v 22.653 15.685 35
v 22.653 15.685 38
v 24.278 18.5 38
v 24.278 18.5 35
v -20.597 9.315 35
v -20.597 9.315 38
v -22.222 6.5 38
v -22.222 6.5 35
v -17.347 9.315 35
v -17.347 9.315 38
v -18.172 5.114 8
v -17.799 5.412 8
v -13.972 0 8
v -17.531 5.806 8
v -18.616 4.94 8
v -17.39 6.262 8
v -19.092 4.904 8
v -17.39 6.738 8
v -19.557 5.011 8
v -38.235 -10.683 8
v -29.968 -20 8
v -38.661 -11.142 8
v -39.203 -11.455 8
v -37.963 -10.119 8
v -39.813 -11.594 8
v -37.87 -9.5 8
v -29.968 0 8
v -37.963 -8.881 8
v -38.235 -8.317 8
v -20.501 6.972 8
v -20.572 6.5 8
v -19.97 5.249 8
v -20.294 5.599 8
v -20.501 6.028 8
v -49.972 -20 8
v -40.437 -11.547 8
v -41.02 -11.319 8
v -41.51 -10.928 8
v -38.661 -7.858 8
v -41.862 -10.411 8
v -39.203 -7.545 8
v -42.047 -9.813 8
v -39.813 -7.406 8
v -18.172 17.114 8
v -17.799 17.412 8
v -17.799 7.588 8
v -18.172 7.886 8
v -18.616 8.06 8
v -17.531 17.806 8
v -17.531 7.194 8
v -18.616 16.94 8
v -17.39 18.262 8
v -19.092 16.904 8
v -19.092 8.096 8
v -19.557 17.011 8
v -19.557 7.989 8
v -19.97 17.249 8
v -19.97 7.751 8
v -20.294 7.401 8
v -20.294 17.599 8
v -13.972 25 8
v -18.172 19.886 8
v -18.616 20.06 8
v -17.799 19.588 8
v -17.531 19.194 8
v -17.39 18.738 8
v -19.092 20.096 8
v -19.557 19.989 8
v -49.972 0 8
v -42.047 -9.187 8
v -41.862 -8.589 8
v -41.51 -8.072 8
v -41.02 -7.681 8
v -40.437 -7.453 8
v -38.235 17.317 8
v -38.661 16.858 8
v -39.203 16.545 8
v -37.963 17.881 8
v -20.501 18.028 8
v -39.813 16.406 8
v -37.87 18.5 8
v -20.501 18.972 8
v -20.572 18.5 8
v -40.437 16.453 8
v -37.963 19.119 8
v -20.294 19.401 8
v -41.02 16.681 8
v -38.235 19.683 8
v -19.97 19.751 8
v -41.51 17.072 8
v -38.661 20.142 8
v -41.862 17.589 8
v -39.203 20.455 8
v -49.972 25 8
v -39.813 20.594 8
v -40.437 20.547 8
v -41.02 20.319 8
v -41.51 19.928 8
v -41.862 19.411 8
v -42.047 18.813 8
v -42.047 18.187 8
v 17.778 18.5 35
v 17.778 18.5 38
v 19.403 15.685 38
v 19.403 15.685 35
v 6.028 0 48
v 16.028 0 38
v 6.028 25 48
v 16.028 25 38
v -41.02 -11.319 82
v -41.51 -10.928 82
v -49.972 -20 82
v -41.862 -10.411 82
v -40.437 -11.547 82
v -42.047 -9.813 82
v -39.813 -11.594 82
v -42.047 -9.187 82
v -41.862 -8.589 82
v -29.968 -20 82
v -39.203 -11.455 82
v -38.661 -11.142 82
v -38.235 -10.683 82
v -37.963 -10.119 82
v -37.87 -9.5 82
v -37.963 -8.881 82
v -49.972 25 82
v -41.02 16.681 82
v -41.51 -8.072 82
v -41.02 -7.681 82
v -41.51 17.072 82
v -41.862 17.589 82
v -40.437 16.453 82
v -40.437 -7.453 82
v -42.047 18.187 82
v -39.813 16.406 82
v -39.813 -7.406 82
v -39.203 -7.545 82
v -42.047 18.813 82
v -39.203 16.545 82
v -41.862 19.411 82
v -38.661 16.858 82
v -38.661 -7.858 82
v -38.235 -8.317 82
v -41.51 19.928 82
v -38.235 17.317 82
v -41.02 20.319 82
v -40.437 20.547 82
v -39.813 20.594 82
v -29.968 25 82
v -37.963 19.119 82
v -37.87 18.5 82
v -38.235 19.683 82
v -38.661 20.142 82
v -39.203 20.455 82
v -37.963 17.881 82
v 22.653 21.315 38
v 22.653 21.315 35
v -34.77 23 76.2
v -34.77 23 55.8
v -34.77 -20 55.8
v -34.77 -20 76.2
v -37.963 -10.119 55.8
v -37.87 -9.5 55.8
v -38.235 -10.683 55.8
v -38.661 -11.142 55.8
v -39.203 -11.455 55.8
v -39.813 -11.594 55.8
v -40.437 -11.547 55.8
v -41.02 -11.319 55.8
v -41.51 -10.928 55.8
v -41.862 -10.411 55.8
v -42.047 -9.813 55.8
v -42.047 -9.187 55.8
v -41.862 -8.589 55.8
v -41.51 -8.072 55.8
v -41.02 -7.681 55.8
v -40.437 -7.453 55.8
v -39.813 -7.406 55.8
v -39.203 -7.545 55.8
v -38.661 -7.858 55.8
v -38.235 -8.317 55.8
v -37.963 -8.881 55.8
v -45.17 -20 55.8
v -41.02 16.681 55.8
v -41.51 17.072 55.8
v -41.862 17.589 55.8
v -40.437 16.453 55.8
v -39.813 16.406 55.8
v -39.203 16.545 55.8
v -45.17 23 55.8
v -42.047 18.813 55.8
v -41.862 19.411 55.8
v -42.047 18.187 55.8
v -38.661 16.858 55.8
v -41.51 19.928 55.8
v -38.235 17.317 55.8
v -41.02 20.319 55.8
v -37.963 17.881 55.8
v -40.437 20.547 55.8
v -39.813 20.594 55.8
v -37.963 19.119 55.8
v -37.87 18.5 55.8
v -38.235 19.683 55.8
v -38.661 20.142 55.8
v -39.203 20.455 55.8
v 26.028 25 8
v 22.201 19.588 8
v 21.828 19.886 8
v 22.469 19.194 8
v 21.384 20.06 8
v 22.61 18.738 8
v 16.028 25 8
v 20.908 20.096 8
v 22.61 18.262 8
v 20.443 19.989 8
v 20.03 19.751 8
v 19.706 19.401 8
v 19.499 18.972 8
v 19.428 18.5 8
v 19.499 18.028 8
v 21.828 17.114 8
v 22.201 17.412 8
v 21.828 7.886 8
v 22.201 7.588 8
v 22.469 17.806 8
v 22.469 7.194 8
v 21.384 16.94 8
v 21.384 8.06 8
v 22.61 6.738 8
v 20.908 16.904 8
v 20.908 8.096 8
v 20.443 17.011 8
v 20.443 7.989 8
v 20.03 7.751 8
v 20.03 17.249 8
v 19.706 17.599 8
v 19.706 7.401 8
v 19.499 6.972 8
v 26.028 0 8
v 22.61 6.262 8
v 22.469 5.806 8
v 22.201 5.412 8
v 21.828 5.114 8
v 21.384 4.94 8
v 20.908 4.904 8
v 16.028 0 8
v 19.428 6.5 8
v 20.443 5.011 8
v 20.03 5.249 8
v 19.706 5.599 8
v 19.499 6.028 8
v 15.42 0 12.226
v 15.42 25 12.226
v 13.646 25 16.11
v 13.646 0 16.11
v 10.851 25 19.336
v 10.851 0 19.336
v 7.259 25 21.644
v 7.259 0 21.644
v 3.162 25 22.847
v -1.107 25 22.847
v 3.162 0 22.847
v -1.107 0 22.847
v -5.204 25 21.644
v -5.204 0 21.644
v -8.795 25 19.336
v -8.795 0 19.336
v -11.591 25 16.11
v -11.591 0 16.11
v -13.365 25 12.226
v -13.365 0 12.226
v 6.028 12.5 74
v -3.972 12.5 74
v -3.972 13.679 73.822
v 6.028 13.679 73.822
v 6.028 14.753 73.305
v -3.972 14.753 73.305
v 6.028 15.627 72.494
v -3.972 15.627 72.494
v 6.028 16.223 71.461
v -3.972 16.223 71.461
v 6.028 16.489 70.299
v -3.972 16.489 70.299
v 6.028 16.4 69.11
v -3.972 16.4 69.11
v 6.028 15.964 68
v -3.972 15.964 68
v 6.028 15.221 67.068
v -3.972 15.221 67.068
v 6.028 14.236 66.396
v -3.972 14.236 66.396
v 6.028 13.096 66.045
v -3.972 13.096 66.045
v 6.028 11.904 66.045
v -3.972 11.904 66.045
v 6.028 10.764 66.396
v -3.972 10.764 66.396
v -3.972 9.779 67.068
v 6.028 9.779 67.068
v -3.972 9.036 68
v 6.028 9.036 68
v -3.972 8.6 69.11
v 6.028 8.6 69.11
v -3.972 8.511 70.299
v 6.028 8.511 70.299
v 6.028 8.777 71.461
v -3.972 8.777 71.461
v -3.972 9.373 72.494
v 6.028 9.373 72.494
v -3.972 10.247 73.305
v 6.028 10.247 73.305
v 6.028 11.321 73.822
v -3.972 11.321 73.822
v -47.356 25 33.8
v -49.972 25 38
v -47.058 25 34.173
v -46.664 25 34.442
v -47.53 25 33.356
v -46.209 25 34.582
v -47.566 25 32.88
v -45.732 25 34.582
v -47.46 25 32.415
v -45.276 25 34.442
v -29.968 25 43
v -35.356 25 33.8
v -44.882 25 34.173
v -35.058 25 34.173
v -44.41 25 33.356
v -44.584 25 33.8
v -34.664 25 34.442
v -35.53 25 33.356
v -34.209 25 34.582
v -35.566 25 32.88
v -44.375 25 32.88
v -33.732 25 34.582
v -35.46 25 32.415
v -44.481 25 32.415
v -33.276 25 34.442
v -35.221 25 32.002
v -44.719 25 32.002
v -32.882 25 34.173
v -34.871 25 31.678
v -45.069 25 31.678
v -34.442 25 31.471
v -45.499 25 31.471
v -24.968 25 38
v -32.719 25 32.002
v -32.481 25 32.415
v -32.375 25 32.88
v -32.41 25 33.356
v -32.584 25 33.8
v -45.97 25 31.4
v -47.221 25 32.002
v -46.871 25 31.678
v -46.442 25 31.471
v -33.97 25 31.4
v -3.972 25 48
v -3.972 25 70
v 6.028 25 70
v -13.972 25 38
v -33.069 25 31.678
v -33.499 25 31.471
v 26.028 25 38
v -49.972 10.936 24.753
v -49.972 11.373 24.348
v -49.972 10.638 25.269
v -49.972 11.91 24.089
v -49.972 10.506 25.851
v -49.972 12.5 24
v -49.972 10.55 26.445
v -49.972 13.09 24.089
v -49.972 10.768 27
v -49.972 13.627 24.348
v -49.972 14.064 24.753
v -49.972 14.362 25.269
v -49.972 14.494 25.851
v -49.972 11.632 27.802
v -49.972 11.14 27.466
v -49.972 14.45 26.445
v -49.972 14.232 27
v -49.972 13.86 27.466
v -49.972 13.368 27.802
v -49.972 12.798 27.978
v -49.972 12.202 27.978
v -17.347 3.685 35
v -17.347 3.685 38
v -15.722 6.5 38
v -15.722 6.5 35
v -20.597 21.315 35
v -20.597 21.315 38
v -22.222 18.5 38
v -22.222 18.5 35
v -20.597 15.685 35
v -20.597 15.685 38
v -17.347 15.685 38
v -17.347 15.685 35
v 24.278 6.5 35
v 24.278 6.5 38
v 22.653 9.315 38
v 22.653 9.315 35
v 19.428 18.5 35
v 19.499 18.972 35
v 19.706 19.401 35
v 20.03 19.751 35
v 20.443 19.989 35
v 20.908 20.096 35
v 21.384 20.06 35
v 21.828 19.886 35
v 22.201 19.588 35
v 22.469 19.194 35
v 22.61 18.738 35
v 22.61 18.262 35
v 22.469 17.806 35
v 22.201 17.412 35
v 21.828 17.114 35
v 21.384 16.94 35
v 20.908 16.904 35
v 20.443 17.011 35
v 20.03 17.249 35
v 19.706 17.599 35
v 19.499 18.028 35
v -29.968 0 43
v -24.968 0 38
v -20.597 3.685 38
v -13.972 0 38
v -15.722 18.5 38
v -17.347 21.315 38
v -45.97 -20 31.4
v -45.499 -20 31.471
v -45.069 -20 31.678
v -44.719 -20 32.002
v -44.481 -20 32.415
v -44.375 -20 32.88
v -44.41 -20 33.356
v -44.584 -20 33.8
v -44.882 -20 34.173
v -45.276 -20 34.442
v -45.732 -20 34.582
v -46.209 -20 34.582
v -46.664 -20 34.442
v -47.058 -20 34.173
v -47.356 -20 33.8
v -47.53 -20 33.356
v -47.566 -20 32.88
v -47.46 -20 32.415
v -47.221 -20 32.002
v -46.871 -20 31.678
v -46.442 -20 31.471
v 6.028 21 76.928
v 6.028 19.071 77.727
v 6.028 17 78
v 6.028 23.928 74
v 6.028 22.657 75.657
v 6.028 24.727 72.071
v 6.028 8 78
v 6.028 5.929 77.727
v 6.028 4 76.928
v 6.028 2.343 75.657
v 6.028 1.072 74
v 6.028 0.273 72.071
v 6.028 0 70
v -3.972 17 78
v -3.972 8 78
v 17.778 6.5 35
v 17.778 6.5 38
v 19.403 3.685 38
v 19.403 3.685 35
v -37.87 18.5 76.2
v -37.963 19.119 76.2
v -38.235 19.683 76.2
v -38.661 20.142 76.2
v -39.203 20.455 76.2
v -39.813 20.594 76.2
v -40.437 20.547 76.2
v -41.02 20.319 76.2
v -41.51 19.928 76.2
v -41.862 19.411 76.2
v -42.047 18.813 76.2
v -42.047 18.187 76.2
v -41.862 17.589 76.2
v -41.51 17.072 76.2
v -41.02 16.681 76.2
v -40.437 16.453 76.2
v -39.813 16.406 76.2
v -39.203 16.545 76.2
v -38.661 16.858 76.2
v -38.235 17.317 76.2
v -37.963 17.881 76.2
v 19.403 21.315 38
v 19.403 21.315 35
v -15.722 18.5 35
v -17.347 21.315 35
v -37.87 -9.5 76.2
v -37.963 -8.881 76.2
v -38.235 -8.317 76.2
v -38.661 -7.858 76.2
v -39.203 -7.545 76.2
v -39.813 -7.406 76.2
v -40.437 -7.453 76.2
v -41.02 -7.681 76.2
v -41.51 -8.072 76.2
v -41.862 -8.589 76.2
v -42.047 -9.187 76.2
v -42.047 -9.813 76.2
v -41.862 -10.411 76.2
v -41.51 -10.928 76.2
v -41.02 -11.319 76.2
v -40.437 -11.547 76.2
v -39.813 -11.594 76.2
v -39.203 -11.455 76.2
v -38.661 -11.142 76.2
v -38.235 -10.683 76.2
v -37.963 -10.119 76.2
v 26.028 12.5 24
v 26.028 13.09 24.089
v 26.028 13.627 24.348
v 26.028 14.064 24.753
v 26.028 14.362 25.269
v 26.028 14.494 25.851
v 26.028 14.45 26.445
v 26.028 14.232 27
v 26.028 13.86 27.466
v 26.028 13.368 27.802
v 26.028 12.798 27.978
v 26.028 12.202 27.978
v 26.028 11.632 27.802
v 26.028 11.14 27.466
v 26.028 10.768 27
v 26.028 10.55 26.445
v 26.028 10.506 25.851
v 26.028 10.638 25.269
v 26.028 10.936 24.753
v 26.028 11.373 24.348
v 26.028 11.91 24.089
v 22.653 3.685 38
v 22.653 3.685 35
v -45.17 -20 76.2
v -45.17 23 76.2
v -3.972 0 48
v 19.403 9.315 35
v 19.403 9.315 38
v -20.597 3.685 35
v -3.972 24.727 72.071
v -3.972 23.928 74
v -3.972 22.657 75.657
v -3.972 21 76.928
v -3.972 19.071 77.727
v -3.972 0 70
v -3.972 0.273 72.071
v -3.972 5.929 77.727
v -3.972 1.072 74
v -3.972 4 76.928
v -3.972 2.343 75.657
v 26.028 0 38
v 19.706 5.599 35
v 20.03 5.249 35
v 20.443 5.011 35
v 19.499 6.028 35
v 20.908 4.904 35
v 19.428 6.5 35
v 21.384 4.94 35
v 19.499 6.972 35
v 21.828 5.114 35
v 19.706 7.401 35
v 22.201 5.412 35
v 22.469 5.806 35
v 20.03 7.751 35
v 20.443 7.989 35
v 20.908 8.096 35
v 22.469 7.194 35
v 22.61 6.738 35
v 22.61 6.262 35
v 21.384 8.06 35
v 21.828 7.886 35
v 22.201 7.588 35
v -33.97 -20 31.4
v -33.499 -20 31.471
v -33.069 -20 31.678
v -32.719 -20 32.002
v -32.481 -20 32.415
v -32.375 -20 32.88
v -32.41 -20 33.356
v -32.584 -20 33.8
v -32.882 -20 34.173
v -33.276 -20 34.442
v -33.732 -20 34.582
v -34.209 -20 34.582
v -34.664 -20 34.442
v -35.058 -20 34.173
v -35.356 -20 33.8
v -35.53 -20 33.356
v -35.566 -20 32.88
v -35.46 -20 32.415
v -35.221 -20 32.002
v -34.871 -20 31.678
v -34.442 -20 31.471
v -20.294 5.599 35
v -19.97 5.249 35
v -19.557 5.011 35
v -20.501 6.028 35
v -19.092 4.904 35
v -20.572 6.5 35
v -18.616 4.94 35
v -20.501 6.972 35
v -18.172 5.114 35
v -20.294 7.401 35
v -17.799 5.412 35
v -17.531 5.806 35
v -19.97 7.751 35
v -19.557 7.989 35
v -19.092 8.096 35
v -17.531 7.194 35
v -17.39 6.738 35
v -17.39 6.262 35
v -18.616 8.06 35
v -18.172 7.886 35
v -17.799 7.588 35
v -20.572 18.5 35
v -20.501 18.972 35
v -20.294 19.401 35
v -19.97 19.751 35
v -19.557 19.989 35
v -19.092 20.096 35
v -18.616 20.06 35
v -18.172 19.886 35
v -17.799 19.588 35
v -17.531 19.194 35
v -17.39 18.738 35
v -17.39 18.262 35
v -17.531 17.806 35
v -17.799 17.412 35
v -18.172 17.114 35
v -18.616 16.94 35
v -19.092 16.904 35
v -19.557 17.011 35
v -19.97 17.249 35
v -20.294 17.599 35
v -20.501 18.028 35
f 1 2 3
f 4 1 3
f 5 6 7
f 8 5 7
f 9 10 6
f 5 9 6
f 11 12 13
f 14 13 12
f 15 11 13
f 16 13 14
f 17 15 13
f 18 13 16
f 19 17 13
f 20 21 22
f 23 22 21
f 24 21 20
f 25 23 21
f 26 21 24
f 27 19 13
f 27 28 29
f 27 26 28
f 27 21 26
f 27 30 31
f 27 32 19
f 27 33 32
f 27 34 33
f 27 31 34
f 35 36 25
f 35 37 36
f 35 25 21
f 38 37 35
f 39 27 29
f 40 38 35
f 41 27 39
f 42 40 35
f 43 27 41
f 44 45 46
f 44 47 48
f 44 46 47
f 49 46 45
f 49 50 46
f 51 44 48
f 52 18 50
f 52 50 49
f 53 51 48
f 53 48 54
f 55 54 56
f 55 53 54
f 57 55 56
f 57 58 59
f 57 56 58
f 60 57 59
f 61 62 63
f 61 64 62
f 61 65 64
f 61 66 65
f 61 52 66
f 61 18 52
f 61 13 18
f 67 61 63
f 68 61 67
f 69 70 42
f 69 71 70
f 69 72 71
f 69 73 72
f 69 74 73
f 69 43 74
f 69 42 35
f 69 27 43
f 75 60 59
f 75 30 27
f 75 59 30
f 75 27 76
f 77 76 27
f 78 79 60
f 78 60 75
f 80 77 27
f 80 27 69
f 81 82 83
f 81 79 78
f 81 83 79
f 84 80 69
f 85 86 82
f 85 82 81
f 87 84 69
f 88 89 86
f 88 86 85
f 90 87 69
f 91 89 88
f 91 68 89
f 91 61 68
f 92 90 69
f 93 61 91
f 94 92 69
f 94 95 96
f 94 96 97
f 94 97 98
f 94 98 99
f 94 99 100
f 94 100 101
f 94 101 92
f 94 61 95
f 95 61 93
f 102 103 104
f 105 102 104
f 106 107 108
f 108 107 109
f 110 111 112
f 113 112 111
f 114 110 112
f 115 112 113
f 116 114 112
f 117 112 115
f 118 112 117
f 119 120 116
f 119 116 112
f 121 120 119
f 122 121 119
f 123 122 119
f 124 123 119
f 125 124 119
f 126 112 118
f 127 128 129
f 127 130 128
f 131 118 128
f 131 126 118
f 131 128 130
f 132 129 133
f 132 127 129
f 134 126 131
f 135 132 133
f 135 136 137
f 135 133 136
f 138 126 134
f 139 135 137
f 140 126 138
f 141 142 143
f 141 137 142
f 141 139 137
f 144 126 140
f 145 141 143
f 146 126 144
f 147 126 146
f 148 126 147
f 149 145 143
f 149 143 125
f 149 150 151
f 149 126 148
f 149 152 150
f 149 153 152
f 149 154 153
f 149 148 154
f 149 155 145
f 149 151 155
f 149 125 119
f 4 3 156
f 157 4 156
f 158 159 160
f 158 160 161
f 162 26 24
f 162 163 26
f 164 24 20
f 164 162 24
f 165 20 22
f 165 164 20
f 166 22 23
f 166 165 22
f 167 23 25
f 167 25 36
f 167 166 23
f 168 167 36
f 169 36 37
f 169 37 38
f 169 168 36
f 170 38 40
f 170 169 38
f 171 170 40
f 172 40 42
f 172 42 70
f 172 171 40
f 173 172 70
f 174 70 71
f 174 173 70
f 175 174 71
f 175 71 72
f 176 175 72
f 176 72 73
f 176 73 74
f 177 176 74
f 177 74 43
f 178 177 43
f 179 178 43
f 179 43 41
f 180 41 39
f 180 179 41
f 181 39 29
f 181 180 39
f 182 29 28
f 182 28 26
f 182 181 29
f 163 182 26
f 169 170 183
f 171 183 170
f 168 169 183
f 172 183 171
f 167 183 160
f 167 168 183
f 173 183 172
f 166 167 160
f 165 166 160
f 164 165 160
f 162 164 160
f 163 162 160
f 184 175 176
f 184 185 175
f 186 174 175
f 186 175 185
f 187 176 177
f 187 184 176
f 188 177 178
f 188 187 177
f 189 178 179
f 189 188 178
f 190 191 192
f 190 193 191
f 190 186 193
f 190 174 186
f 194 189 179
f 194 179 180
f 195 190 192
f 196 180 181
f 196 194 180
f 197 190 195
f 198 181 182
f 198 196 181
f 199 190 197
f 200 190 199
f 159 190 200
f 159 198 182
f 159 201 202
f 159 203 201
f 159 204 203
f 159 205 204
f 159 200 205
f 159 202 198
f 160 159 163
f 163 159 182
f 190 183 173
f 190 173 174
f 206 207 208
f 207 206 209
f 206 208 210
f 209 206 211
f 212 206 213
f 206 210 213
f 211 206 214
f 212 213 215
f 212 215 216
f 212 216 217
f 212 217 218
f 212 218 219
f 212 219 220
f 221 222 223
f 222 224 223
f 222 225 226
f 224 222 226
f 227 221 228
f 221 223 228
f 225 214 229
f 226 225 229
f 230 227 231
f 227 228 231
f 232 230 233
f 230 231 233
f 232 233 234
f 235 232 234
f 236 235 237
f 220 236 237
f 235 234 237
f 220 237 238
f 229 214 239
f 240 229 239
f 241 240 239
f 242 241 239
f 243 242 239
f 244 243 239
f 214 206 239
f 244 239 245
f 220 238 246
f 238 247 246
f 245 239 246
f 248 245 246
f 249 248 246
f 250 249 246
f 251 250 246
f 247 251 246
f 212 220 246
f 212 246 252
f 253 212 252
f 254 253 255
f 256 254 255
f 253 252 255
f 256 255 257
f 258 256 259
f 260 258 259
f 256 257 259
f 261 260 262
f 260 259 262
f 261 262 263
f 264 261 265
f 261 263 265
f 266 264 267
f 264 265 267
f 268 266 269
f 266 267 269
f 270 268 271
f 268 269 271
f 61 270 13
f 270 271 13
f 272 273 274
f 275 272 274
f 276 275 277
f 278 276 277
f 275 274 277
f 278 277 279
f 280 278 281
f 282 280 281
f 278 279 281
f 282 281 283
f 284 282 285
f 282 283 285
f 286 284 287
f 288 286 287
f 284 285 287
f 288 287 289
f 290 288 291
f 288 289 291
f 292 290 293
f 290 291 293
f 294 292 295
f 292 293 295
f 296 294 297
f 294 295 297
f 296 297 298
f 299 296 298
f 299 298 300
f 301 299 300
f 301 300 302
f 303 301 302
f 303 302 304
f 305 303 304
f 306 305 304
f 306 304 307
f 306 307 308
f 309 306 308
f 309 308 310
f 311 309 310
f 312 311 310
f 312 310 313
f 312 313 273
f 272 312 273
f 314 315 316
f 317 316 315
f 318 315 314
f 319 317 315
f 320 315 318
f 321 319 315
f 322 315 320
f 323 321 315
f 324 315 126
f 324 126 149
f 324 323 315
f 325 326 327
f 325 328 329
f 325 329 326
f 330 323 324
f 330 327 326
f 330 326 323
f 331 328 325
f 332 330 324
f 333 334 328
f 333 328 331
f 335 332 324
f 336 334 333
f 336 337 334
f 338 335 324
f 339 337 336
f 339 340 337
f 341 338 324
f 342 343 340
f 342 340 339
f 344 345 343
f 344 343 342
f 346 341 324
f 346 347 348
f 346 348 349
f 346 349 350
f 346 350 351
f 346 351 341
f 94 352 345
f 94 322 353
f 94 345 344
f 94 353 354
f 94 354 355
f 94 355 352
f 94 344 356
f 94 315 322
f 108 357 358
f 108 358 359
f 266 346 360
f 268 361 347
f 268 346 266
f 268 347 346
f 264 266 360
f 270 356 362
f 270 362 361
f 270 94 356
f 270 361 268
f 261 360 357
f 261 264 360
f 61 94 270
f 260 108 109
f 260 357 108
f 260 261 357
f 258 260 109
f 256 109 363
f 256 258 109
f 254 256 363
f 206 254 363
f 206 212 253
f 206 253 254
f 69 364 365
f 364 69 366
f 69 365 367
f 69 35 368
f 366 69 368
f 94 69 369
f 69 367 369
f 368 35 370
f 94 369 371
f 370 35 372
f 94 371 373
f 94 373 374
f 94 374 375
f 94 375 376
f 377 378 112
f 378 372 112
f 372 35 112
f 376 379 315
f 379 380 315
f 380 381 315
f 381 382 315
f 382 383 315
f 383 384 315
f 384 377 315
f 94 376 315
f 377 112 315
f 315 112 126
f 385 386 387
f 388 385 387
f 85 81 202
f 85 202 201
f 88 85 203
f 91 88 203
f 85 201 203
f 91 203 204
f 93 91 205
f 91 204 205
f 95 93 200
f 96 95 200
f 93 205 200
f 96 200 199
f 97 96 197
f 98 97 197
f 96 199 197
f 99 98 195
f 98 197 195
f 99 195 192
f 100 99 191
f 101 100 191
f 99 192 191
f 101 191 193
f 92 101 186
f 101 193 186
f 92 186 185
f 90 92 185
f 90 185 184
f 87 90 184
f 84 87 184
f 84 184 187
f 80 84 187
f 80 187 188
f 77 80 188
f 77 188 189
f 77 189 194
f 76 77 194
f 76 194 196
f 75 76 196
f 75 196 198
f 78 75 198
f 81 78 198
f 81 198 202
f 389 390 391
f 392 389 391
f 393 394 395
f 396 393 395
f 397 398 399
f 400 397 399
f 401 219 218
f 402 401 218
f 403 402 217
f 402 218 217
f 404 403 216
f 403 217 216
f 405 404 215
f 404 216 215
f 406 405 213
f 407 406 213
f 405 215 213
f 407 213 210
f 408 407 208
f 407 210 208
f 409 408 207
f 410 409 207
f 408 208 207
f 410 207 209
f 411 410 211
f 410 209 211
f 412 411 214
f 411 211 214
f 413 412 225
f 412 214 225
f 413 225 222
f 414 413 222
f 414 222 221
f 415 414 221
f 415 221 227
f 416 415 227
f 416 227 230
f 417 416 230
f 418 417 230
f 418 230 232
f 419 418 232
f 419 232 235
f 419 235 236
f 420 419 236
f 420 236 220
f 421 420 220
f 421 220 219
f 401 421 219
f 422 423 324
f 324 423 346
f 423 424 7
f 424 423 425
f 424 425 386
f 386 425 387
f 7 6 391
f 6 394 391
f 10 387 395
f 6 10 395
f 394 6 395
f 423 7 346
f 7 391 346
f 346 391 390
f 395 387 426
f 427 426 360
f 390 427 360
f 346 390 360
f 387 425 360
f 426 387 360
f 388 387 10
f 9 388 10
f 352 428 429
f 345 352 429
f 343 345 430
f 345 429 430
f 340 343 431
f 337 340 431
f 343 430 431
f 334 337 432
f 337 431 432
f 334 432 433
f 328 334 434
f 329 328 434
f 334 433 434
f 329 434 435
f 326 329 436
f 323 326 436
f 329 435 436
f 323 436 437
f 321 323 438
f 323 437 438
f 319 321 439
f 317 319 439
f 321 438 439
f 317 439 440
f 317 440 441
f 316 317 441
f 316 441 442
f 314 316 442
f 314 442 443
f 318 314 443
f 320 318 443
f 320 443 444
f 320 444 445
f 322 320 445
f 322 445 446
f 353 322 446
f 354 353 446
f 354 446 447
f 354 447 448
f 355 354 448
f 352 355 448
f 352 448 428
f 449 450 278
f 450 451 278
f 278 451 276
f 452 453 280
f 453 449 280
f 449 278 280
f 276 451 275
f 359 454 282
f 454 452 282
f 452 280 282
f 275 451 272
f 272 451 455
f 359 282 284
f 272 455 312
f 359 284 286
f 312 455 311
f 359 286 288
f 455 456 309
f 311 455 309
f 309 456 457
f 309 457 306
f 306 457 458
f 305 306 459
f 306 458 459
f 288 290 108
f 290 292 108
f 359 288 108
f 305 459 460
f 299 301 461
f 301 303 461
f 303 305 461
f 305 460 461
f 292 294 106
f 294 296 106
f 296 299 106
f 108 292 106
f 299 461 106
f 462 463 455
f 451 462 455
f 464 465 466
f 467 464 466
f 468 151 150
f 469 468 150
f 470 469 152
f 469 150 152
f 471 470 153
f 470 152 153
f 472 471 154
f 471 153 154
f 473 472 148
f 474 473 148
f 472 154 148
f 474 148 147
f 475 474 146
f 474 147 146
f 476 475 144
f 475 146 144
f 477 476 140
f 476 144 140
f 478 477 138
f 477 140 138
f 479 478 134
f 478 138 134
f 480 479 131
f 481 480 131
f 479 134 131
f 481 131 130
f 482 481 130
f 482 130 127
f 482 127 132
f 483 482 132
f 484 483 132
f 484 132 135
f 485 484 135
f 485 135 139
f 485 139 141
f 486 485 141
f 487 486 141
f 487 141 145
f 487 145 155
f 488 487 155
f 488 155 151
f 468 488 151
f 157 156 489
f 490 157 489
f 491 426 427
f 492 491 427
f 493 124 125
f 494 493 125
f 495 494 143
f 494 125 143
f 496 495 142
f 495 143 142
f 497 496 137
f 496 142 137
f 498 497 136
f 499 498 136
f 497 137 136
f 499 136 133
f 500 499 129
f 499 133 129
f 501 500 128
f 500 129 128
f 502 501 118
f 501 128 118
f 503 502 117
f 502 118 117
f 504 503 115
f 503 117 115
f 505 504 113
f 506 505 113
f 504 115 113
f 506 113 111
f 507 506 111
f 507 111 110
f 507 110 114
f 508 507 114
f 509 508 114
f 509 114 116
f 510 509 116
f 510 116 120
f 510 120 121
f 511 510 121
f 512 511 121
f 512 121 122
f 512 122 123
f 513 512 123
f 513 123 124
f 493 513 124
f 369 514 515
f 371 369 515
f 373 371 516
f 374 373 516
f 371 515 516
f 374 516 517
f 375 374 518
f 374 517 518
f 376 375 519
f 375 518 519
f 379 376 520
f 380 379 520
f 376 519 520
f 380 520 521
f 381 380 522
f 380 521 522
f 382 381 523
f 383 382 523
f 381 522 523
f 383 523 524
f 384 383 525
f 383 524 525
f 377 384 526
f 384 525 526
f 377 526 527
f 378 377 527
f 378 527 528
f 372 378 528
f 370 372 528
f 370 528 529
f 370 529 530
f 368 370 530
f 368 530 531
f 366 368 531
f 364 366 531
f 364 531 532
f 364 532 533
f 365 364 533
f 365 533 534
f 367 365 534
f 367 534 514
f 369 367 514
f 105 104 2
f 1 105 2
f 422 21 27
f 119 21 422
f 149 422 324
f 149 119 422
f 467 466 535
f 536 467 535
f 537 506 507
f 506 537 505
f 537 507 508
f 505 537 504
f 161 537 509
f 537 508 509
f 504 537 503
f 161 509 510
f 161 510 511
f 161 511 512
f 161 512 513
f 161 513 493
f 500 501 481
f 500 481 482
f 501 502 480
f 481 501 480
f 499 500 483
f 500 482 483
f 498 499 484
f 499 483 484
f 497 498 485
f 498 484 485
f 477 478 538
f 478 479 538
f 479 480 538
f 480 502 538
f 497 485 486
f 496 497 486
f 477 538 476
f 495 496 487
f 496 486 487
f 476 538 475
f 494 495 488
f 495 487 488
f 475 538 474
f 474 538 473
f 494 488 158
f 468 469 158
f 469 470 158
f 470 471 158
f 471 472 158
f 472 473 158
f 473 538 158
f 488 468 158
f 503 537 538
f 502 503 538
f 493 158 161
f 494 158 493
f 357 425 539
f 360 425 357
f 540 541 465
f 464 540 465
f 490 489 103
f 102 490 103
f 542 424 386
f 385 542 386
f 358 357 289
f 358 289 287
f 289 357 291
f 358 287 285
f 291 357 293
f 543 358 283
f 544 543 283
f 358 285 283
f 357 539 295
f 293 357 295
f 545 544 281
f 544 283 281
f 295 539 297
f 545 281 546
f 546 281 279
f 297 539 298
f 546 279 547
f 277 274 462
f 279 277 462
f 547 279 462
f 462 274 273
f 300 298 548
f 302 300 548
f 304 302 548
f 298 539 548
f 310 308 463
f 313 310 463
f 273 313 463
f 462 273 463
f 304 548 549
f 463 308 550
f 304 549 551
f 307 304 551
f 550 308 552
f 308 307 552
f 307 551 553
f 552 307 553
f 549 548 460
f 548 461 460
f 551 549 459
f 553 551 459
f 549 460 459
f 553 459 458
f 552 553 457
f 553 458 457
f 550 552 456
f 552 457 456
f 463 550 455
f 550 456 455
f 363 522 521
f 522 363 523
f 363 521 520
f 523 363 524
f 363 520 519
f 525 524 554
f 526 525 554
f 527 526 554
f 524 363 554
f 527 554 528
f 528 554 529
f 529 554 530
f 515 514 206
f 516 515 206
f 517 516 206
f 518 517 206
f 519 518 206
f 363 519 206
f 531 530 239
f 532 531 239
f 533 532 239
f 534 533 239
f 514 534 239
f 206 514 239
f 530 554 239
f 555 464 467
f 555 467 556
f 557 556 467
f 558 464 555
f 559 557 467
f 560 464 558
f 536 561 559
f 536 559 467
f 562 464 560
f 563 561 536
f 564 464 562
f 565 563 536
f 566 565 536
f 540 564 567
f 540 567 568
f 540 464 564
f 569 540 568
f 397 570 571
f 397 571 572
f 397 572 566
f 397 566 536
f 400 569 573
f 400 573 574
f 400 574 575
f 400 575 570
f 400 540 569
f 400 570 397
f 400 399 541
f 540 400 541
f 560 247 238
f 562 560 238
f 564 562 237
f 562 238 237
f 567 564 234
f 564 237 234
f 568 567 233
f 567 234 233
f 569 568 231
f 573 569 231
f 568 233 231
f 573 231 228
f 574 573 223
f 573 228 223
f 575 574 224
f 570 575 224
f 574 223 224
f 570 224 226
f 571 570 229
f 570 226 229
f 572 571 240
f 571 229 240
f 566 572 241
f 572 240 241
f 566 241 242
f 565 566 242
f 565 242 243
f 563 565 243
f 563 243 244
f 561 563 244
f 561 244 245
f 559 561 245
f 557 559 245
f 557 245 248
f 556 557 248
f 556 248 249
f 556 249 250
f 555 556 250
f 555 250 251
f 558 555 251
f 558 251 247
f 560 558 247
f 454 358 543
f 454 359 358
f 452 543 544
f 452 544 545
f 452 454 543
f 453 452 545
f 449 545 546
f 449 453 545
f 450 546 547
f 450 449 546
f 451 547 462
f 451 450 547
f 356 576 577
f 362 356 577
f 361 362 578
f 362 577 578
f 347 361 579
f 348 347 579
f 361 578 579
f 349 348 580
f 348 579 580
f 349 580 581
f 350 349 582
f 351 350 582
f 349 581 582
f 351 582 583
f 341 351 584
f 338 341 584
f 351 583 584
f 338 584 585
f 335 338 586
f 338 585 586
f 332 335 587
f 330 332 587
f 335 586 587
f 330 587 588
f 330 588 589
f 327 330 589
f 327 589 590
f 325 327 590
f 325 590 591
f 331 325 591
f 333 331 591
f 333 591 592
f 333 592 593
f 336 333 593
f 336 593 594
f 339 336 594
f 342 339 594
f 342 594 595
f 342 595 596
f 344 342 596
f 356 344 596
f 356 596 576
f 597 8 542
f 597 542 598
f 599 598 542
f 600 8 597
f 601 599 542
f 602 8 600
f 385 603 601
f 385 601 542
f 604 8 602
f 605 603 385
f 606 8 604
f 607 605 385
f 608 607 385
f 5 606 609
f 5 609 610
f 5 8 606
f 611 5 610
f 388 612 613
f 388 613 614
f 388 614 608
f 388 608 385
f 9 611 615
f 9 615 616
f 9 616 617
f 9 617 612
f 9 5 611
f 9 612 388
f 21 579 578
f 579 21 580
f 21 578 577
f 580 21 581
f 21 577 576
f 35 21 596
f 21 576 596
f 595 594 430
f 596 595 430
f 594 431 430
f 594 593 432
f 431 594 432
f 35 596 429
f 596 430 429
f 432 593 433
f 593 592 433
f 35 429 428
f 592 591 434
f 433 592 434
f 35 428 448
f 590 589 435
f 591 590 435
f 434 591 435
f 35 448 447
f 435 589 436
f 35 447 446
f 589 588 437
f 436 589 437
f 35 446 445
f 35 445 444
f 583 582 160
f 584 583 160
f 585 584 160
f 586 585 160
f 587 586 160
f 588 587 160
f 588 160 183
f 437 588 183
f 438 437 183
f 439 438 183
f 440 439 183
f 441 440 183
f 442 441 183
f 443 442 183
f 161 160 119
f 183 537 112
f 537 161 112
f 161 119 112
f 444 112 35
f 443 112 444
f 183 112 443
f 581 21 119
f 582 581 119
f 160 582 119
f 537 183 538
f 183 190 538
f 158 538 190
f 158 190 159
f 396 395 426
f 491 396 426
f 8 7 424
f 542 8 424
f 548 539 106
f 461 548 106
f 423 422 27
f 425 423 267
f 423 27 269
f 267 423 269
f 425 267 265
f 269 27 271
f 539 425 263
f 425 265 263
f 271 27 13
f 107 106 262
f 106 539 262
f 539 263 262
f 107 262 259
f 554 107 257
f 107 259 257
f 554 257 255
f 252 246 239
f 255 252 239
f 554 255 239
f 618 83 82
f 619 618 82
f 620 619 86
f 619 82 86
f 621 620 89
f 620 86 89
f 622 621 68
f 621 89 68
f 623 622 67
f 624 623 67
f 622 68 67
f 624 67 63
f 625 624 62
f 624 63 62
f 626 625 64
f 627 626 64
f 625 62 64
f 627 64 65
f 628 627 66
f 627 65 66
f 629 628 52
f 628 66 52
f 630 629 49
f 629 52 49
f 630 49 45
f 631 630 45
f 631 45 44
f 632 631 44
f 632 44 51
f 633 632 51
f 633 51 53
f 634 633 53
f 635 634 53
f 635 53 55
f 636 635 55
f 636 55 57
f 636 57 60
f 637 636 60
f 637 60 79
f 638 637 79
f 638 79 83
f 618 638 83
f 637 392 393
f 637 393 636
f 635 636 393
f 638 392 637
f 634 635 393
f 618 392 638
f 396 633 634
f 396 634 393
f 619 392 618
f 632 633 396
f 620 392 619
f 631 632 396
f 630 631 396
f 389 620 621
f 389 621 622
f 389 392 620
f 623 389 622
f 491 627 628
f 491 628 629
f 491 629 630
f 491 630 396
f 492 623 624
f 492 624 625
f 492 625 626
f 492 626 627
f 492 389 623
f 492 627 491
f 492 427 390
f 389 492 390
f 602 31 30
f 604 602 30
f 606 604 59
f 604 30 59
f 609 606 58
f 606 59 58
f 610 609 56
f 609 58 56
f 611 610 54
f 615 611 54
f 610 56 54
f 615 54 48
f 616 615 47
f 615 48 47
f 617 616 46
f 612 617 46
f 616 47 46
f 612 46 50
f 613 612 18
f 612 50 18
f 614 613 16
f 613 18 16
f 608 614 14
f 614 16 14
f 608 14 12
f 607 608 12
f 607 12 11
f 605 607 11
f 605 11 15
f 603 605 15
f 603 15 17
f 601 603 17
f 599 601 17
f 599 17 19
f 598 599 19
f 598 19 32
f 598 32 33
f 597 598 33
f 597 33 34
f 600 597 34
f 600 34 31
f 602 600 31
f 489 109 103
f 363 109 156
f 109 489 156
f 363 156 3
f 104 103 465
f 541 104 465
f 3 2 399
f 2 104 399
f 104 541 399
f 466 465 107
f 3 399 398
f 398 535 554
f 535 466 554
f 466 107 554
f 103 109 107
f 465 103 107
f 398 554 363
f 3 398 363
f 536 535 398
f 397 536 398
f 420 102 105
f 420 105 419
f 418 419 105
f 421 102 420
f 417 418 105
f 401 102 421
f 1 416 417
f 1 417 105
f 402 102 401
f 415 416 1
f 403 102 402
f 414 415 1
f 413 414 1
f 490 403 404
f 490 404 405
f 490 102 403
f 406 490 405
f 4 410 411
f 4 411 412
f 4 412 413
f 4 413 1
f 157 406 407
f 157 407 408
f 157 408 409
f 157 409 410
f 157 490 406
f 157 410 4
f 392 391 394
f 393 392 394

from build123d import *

# Parameters (mm, degrees)
BOSS_EXTRUDE1_DEPTH = 25
SKETCH2_R           = 4
CUT_EXTRUDE1_DEPTH  = 88.229582138
SKETCH3_R           = 1.6
CUT_EXTRUDE2_DEPTH  = 79.755553628
CUT_EXTRUDE3_DEPTH  = 3
FILLET2_R           = 8
CHAMFER2_SIZE       = 10
SKETCH5_W           = 30
SKETCH5_H           = 25
BOSS_EXTRUDE2_DEPTH = 26
SKETCH6_W           = 20.004484435
SKETCH6_H           = 25
BOSS_EXTRUDE3_DEPTH = 44
SKETCH7_W           = 10.4
SKETCH7_H           = 20.4
CUT_EXTRUDE4_DEPTH  = 23
SKETCH9_W           = 20.004484435
SKETCH9_H           = 44
SKETCH9_W_2         = 10.4
SKETCH9_H_2         = 20.4
BOSS_EXTRUDE4_DEPTH = 20
SKETCH10_R          = 2.1
CUT_EXTRUDE6_DEPTH  = 93.726686192
CHAMFER5_SIZE       = 5
SKETCH11_R          = 2
CUT_EXTRUDE7_DEPTH  = 115.564392374
SKETCH12_W          = 20.004484435
SKETCH12_H          = 20
SKETCH12_R          = 2.1
BOSS_EXTRUDE5_DEPTH = 30
SKETCH13_R          = 1.6
CUT_EXTRUDE8_DEPTH  = 107.048283023


with BuildPart() as part:
    # Sketch1 → Boss-Extrude1 (new body)
    with BuildSketch(Plane(origin=(0, 0, 0), x_dir=(1, 0, 0), z_dir=(0, 1, 0))):
        with BuildLine():
            Line((-13.972375691, -8), (-23.972375691, -8))
            Line((-23.972375691, -8), (-23.972375691, -38))
            Line((-23.972375691, -38), (-3.972375691, -38))
            Line((-3.972375691, -38), (-3.972375691, -78))
            Line((-3.972375691, -78), (6.027624309, -78))
            Line((6.027624309, -78), (6.027624309, -38))
            Line((6.027624309, -38), (26.027624309, -38))
            Line((26.027624309, -38), (26.027624309, -8))
            Line((26.027624309, -8), (16.027624309, -8))
            ThreePointArc((16.027624309, -8), (1.027624309, -23), (-13.972375691, -8))
        make_face()
    extrude(amount=BOSS_EXTRUDE1_DEPTH)

    # Sketch2 → Cut-Extrude1 (cut, through all)
    with BuildSketch(Plane.ZY.offset(3.972375691)):
        with Locations((70, 12.5)):
            Circle(SKETCH2_R)
    extrude(amount=-CUT_EXTRUDE1_DEPTH, mode=Mode.SUBTRACT)

    # Sketch3 → Cut-Extrude2 (cut, through all)
    with BuildSketch(Plane(origin=(0, 0, 8), x_dir=(-1, 0, 0), z_dir=(0, 0, -1))):
        with Locations((-21.027624309, 6.5)):
            Circle(SKETCH3_R)
        with Locations((-21.027624309, 18.5)):
            Circle(SKETCH3_R)
        with Locations((18.972375691, 6.5)):
            Circle(SKETCH3_R)
        with Locations((18.972375691, 18.5)):
            Circle(SKETCH3_R)
    extrude(amount=-CUT_EXTRUDE2_DEPTH, mode=Mode.SUBTRACT)

    # Sketch4 → Cut-Extrude3 (cut)
    with BuildSketch(Plane.XY.offset(38)):
        Polygon((24.277624309, 18.5), (22.652624309, 21.314582562), (19.402624309, 21.314582562), (17.777624309, 18.5), (19.402624309, 15.685417438), (22.652624309, 15.685417438), align=None)
        Polygon((24.277624309, 6.5), (22.652624309, 9.314582562), (19.402624309, 9.314582562), (17.777624309, 6.5), (19.402624309, 3.685417438), (22.652624309, 3.685417438), align=None)
        Polygon((-15.722375691, 18.5), (-17.347375691, 21.314582562), (-20.597375691, 21.314582562), (-22.222375691, 18.5), (-20.597375691, 15.685417438), (-17.347375691, 15.685417438), align=None)
        Polygon((-15.722375691, 6.5), (-17.347375691, 9.314582562), (-20.597375691, 9.314582562), (-22.222375691, 6.5), (-20.597375691, 3.685417438), (-17.347375691, 3.685417438), align=None)
    extrude(amount=-CUT_EXTRUDE3_DEPTH, mode=Mode.SUBTRACT)

    # Fillet2
    fillet2_edges = [part.edges().sort_by_distance(p)[0] for p in [
        (1.027624309, 0, 78),
        (1.027624309, 25, 78),
    ]]
    fillet(fillet2_edges, radius=FILLET2_R)

    # Chamfer2
    chamfer2_edges = [part.edges().sort_by_distance(p)[0] for p in [
        (6.027624309, 12.5, 38),
        (-3.972375691, 12.5, 38),
    ]]
    chamfer(chamfer2_edges, length=CHAMFER2_SIZE)

    # Sketch5 → Boss-Extrude2 (add)
    with BuildSketch(Plane.ZY.offset(23.972375691)):
        with Locations((23, 12.5)):
            Rectangle(SKETCH5_W, SKETCH5_H)
    extrude(amount=BOSS_EXTRUDE2_DEPTH)

    # Sketch6 → Boss-Extrude3 (add)
    with BuildSketch(Plane.XY.offset(38)):
        with Locations((-39.970133473, 12.5)):
            Rectangle(SKETCH6_W, SKETCH6_H)
    extrude(amount=BOSS_EXTRUDE3_DEPTH)

    # Sketch7 → Cut-Extrude4 (cut)
    with BuildSketch(Plane.XZ):
        with Locations((-39.970133474, 66)):
            Rectangle(SKETCH7_W, SKETCH7_H)
    extrude(amount=-CUT_EXTRUDE4_DEPTH, mode=Mode.SUBTRACT)

    # Sketch9 → Boss-Extrude4 (add)
    with BuildSketch(Plane.XZ):
        with Locations((-39.970133473, 60)):
            Rectangle(SKETCH9_W, SKETCH9_H)
        with Locations((-39.970133474, 66)):
            Rectangle(SKETCH9_W_2, SKETCH9_H_2, mode=Mode.SUBTRACT)
    extrude(amount=BOSS_EXTRUDE4_DEPTH)

    # Sketch10 → Cut-Extrude6 (cut, through all)
    with BuildSketch(Plane.XY.offset(82)):
        with Locations((-39.970133474, -9.5)):
            Circle(SKETCH10_R)
        with Locations((-39.970133474, 18.5)):
            Circle(SKETCH10_R)
    extrude(amount=-CUT_EXTRUDE6_DEPTH, mode=Mode.SUBTRACT)

    # Chamfer5
    chamfer5_edges = [part.edges().sort_by_distance(p)[0] for p in [
        (-29.967891256, 12.5, 38),
    ]]
    chamfer(chamfer5_edges, length=CHAMFER5_SIZE)

    # Sketch11 → Cut-Extrude7 (cut, through all)
    with BuildSketch(Plane(origin=(26.027624309, 0, 0), x_dir=(0, 0, -1), z_dir=(1, 0, 0))):
        with Locations((-26, 12.5)):
            Circle(SKETCH11_R)
    extrude(amount=-CUT_EXTRUDE7_DEPTH, mode=Mode.SUBTRACT)

    # Sketch12 → Boss-Extrude5 (add)
    with BuildSketch(Plane(origin=(0, 0, 38), x_dir=(-1, 0, 0), z_dir=(0, 0, -1))):
        with Locations((39.970133473, -10)):
            Rectangle(SKETCH12_W, SKETCH12_H)
        with Locations(Location((39.970133474, -9.5, 0), (0, 0, 180))):
            Circle(SKETCH12_R, mode=Mode.SUBTRACT)
    extrude(amount=BOSS_EXTRUDE5_DEPTH)

    # Sketch13 → Cut-Extrude8 (cut, through all)
    with BuildSketch(Plane.XZ.offset(20)):
        with Locations(Location((-33.970133474, 33, 0), (0, 0, 270))):
            Circle(SKETCH13_R)
        with Locations(Location((-45.970133474, 33, 0), (0, 0, 270))):
            Circle(SKETCH13_R)
    extrude(amount=-CUT_EXTRUDE8_DEPTH, mode=Mode.SUBTRACT)


solid = part.part
